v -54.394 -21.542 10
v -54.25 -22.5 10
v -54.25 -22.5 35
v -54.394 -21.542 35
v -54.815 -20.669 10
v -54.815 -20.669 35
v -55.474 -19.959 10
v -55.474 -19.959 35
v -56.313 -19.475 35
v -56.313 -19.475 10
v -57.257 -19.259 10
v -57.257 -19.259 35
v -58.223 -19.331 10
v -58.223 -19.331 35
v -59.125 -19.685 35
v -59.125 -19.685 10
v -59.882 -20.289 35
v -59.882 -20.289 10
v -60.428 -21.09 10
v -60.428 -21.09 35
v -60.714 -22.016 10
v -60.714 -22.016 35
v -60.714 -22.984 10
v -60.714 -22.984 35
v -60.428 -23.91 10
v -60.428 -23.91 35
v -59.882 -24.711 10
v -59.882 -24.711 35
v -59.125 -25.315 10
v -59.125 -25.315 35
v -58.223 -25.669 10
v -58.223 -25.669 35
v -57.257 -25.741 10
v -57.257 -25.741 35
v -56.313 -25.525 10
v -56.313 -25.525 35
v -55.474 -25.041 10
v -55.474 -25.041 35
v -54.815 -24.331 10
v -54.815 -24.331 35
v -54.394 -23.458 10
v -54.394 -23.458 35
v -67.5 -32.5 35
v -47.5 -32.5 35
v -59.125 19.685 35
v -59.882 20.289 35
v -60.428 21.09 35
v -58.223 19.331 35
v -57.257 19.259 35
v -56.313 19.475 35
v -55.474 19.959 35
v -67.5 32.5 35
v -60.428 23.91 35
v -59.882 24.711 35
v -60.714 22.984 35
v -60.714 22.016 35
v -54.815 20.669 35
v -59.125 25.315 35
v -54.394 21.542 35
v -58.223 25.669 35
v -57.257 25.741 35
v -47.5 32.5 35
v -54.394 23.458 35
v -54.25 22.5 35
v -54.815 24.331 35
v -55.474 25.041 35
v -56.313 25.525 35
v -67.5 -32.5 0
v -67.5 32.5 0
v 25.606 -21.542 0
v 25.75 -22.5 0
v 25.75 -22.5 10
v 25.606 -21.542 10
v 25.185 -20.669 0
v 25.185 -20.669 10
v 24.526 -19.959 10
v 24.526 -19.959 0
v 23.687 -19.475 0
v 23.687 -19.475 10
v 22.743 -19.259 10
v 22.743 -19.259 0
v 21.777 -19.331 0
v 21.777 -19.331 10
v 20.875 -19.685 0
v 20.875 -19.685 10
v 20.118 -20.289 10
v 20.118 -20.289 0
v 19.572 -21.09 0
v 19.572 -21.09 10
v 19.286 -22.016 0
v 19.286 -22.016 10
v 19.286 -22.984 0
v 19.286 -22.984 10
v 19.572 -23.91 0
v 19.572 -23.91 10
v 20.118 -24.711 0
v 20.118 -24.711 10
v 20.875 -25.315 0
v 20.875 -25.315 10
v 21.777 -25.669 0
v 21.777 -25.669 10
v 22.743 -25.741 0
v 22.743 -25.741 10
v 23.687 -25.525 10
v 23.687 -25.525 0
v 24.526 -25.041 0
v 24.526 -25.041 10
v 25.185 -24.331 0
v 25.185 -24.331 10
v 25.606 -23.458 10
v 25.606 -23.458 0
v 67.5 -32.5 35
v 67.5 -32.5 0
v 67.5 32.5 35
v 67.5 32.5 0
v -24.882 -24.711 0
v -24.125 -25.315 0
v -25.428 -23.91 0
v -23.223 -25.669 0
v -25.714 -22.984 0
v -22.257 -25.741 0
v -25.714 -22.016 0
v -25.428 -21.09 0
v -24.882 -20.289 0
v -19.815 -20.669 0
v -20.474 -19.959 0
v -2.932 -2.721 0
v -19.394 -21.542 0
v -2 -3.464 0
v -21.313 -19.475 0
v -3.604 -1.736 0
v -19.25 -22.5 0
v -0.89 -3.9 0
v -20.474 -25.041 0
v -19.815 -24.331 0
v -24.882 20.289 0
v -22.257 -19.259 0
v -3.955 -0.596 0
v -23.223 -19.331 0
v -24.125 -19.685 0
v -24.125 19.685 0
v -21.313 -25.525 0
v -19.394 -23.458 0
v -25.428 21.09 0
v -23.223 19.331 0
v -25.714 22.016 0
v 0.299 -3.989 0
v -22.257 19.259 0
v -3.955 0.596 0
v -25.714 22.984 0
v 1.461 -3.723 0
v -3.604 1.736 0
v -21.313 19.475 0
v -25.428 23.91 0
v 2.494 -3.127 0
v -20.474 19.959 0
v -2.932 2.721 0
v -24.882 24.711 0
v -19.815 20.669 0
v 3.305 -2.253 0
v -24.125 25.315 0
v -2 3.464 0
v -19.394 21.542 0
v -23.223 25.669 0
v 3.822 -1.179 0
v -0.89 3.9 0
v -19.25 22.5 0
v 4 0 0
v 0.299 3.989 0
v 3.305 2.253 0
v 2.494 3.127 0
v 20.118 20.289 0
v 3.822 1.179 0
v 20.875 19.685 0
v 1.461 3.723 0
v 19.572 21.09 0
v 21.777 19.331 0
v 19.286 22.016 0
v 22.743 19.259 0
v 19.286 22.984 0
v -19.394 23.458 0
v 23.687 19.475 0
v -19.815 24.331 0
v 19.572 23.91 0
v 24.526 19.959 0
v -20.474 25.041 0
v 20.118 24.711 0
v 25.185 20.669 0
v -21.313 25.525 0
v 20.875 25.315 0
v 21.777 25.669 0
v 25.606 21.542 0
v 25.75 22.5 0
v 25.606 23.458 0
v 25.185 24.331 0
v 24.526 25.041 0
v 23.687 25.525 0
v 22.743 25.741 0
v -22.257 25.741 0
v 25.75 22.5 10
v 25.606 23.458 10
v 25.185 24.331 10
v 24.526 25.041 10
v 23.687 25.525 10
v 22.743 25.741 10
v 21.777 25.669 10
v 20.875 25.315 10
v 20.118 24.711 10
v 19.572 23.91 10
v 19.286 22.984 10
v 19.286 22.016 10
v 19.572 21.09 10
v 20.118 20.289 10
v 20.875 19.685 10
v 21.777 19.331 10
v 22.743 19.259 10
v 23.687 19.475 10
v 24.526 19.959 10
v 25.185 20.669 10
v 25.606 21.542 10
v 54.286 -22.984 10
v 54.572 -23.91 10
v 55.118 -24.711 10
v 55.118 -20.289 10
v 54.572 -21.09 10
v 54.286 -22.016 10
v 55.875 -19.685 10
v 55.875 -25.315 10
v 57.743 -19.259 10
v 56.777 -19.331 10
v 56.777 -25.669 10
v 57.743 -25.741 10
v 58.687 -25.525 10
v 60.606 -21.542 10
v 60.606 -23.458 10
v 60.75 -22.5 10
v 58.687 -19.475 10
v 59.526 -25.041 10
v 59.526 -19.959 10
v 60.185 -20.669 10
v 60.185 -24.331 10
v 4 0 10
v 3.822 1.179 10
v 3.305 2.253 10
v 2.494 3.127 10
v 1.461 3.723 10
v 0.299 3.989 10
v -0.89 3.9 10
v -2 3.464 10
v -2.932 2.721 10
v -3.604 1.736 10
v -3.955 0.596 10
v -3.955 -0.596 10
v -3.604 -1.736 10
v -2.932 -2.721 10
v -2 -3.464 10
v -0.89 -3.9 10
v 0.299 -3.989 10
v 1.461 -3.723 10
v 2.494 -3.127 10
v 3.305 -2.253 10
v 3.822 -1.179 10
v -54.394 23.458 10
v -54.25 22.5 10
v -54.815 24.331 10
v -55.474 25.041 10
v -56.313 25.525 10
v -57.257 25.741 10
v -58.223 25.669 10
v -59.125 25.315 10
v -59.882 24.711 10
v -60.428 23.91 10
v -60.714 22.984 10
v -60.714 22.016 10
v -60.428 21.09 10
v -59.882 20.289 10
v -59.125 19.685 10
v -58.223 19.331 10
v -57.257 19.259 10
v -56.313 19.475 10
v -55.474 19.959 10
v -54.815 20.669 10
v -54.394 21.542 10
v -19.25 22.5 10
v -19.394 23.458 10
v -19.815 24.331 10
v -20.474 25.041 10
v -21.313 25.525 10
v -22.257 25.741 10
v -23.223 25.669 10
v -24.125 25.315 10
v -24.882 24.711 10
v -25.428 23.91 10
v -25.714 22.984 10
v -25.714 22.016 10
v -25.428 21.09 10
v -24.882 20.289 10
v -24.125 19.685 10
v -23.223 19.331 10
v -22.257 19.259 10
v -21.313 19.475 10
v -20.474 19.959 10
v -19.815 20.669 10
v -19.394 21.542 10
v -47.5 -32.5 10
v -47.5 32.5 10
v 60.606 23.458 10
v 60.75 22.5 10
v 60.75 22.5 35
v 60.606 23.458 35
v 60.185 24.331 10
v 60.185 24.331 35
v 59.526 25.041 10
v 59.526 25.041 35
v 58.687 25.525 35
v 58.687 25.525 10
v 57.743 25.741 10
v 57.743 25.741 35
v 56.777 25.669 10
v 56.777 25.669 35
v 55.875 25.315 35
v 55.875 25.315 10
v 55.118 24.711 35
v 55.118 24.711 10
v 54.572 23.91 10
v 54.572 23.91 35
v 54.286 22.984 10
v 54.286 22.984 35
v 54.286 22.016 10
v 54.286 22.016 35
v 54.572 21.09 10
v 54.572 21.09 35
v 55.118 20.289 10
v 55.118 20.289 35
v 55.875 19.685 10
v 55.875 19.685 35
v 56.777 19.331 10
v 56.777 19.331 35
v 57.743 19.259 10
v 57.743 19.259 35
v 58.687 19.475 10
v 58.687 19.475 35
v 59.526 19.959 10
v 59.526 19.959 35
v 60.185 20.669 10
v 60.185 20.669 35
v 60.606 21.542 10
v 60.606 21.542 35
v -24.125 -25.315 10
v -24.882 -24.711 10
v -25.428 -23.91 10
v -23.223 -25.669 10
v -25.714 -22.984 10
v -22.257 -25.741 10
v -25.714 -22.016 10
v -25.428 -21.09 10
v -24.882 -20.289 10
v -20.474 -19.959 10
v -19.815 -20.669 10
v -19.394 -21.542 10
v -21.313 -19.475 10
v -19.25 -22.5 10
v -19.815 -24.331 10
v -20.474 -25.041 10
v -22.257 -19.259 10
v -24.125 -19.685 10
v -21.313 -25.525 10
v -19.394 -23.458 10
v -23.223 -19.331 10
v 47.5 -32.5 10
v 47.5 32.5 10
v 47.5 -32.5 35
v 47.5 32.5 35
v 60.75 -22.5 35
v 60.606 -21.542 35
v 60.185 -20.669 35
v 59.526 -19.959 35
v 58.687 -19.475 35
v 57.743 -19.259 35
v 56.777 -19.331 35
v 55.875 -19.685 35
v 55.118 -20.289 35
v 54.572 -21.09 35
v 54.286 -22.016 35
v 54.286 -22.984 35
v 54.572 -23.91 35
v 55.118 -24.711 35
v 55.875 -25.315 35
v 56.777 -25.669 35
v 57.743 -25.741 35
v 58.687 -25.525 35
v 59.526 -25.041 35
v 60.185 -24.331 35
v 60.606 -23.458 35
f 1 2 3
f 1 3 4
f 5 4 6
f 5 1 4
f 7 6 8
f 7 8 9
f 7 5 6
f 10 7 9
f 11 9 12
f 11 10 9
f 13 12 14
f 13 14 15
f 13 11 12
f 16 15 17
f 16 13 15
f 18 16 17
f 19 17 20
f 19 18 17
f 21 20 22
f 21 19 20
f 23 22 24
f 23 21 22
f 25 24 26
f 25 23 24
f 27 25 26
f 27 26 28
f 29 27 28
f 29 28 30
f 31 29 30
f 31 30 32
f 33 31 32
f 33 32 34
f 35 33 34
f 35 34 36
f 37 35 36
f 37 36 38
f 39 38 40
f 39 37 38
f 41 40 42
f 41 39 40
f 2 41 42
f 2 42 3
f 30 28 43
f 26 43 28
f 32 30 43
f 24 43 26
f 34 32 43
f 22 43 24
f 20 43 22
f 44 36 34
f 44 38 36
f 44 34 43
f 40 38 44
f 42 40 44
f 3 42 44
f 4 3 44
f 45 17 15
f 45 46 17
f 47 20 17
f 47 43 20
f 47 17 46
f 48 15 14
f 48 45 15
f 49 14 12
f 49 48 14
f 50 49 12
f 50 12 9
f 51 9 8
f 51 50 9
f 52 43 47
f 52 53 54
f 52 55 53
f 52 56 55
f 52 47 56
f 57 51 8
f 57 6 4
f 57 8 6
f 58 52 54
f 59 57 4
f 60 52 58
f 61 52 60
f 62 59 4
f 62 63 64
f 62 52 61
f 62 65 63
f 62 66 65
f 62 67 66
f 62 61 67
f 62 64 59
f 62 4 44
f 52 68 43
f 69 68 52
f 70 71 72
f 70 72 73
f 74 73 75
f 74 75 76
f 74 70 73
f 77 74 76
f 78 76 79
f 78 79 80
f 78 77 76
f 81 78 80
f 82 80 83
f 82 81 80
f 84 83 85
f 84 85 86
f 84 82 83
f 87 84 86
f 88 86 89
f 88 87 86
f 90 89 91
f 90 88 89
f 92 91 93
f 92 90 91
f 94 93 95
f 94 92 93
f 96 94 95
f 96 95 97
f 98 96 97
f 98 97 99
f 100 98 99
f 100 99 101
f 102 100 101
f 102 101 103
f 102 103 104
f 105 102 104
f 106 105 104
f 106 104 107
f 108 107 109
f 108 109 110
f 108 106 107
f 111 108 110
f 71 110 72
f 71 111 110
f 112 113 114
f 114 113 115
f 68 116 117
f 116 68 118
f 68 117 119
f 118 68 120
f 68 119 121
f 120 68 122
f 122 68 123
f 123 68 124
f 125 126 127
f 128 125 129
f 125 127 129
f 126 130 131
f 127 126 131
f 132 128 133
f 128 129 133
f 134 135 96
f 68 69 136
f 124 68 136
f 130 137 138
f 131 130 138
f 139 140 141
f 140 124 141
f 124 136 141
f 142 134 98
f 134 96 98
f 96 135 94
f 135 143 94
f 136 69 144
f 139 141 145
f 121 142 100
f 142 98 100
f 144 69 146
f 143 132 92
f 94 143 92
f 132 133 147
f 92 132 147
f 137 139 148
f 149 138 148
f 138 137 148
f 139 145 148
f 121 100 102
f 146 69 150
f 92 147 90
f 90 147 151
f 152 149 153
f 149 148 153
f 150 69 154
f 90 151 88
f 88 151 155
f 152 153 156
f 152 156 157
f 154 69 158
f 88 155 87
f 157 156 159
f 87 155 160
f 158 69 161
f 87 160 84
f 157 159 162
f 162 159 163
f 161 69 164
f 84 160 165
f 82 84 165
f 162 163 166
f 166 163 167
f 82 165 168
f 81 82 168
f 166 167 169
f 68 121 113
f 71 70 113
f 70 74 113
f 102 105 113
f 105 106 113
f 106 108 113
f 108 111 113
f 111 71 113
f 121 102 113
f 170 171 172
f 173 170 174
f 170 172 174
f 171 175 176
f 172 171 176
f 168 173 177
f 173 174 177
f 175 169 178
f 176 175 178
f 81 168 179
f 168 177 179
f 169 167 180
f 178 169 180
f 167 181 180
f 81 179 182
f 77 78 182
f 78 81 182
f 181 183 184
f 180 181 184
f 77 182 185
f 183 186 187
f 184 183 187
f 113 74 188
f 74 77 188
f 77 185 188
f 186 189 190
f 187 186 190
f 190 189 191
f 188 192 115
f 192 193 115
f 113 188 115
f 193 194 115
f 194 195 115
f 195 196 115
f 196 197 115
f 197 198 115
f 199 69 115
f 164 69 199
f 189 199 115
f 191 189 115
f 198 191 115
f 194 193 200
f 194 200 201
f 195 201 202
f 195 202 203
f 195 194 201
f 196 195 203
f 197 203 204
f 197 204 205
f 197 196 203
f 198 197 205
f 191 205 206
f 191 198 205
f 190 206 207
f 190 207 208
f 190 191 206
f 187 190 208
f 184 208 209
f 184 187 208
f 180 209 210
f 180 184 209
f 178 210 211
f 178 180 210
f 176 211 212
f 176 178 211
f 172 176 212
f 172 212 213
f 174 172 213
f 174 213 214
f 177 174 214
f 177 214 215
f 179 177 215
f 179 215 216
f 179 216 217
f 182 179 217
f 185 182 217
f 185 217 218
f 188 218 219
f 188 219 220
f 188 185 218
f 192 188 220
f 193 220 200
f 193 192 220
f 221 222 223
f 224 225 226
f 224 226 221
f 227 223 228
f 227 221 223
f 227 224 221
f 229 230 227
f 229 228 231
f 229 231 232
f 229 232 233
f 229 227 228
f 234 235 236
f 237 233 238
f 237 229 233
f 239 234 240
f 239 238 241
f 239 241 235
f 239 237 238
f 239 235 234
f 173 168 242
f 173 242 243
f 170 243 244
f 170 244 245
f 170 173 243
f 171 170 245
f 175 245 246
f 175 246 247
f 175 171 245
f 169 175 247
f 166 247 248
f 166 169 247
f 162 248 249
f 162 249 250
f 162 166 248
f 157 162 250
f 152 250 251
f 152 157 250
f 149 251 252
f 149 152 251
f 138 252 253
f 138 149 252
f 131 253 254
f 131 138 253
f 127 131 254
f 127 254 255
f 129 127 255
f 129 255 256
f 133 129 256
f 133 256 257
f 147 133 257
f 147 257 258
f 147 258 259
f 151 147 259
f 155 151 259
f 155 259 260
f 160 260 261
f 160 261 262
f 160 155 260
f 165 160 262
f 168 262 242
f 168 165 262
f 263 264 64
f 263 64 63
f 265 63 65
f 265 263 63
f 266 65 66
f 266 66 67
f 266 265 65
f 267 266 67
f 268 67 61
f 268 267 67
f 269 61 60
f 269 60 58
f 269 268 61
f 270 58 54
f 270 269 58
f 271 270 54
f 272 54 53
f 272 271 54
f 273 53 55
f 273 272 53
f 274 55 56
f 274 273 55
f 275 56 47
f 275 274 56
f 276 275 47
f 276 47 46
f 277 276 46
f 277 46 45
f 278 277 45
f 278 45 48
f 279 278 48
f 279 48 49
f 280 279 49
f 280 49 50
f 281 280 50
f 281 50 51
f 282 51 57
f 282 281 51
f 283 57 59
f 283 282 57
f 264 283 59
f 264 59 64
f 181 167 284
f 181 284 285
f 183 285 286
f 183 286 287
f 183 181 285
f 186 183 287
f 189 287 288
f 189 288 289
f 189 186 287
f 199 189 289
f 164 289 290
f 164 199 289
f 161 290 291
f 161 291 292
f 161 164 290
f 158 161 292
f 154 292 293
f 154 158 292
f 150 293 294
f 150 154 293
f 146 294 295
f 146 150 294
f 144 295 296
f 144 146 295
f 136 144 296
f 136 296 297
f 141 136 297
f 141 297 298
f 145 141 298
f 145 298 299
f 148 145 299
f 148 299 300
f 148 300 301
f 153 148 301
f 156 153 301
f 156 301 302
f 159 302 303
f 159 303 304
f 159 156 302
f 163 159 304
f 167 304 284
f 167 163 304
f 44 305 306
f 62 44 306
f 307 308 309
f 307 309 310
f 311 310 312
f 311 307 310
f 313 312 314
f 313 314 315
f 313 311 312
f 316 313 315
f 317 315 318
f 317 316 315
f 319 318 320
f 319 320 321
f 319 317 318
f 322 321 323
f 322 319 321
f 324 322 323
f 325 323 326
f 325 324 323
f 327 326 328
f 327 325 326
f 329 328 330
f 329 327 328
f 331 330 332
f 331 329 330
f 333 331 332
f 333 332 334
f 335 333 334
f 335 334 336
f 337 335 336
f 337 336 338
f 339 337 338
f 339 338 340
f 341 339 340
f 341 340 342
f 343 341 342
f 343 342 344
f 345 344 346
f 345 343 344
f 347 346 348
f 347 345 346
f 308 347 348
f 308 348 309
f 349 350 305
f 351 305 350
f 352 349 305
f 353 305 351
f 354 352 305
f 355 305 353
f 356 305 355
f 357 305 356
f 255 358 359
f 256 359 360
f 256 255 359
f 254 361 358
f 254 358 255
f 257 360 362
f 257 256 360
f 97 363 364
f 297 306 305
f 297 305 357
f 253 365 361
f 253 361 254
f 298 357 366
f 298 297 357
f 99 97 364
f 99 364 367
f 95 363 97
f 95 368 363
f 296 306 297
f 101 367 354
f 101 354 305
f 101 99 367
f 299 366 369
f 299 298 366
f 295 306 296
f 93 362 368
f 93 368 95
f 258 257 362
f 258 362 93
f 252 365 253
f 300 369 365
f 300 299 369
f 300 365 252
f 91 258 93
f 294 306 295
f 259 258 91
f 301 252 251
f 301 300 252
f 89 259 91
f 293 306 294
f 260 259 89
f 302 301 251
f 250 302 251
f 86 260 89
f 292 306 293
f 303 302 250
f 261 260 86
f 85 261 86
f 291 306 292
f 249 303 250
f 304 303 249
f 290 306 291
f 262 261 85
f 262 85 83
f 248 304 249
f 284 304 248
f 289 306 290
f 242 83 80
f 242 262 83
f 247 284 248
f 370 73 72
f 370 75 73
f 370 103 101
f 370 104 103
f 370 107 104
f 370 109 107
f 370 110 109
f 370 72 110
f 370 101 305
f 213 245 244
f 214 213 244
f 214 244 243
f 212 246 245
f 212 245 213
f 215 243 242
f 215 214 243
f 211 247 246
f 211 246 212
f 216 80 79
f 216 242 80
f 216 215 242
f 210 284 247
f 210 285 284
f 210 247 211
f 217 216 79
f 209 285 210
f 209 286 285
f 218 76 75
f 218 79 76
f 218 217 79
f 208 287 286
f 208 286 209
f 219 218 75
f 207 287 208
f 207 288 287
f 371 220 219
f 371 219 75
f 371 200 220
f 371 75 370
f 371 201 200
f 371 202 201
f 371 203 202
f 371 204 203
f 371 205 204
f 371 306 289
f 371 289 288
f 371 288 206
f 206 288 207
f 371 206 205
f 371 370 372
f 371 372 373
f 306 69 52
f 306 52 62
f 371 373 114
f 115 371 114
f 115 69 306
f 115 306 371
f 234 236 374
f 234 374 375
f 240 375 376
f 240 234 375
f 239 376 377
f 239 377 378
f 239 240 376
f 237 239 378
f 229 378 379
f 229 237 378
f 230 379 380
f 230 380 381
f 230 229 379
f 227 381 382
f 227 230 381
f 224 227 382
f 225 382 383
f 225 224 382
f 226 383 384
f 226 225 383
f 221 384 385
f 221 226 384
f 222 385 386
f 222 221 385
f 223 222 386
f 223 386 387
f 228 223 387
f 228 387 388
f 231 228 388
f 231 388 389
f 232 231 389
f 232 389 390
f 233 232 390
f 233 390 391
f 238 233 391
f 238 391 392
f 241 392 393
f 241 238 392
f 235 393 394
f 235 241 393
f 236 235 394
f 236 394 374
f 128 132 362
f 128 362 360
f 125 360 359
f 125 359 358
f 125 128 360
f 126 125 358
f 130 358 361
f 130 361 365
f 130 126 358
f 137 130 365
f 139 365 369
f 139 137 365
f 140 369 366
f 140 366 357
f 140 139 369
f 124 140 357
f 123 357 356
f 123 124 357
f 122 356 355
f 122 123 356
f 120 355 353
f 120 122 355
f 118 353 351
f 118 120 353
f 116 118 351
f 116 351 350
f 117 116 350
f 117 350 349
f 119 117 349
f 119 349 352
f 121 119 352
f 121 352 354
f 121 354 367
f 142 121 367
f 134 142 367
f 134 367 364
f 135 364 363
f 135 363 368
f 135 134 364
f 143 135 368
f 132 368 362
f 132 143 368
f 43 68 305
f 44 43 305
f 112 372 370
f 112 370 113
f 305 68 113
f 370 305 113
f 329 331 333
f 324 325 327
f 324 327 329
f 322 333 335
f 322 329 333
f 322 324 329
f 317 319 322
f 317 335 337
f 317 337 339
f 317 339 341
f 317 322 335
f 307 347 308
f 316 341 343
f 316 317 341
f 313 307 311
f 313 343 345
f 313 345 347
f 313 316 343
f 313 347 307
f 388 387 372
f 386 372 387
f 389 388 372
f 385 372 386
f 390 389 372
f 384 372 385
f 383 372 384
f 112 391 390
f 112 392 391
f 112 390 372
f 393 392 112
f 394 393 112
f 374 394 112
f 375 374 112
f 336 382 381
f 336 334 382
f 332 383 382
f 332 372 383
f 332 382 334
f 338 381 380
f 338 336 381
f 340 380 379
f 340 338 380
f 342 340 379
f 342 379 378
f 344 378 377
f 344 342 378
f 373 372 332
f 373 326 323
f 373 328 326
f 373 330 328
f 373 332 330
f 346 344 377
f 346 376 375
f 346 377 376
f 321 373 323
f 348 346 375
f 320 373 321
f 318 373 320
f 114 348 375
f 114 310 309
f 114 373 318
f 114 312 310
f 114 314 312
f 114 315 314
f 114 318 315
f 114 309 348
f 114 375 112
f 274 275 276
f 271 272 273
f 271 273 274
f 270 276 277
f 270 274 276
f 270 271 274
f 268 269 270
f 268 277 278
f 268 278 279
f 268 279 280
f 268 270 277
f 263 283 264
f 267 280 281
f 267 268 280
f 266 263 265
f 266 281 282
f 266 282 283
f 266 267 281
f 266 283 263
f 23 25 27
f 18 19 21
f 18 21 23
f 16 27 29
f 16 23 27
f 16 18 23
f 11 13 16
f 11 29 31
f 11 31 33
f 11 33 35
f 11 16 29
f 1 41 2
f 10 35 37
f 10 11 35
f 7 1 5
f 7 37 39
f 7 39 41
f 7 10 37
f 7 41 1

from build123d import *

# Parameters (mm, degrees)
F0_W     = 135
F0_H     = 65
F0_R     = 3.25
F0_R_2   = 4
F1_DEPTH = 10
F2_W     = 20
F2_H     = 65
F2_R     = 3.25
F3_DEPTH = 25


with BuildPart() as f1:
    # F0 (on Top) → F1 (new body)
    with BuildSketch(Plane.XY):
        Rectangle(F0_W, F0_H)
        with Locations((-22.5, -22.5)):
            Circle(F0_R, mode=Mode.SUBTRACT)
        with Locations((22.5, -22.5)):
            Circle(F0_R, mode=Mode.SUBTRACT)
        with Locations((-22.5, 22.5)):
            Circle(F0_R, mode=Mode.SUBTRACT)
        Circle(F0_R_2, mode=Mode.SUBTRACT)
        with Locations((22.5, 22.5)):
            Circle(F0_R, mode=Mode.SUBTRACT)
    extrude(amount=F1_DEPTH)

    # F2 (on face) → F3 (join)
    with BuildSketch(Plane.XY.offset(10)):
        with Locations((57.5, 0)):
            Rectangle(F2_W, F2_H)
        with Locations((57.5, -22.5)):
            Circle(F2_R, mode=Mode.SUBTRACT)
        with Locations((57.5, 22.5)):
            Circle(F2_R, mode=Mode.SUBTRACT)
        with Locations((-57.5, 0)):
            Rectangle(F2_W, F2_H)
        with Locations((-57.5, -22.5)):
            Circle(F2_R, mode=Mode.SUBTRACT)
        with Locations((-57.5, 22.5)):
            Circle(F2_R, mode=Mode.SUBTRACT)
    extrude(amount=F3_DEPTH)


solid = f1.part
